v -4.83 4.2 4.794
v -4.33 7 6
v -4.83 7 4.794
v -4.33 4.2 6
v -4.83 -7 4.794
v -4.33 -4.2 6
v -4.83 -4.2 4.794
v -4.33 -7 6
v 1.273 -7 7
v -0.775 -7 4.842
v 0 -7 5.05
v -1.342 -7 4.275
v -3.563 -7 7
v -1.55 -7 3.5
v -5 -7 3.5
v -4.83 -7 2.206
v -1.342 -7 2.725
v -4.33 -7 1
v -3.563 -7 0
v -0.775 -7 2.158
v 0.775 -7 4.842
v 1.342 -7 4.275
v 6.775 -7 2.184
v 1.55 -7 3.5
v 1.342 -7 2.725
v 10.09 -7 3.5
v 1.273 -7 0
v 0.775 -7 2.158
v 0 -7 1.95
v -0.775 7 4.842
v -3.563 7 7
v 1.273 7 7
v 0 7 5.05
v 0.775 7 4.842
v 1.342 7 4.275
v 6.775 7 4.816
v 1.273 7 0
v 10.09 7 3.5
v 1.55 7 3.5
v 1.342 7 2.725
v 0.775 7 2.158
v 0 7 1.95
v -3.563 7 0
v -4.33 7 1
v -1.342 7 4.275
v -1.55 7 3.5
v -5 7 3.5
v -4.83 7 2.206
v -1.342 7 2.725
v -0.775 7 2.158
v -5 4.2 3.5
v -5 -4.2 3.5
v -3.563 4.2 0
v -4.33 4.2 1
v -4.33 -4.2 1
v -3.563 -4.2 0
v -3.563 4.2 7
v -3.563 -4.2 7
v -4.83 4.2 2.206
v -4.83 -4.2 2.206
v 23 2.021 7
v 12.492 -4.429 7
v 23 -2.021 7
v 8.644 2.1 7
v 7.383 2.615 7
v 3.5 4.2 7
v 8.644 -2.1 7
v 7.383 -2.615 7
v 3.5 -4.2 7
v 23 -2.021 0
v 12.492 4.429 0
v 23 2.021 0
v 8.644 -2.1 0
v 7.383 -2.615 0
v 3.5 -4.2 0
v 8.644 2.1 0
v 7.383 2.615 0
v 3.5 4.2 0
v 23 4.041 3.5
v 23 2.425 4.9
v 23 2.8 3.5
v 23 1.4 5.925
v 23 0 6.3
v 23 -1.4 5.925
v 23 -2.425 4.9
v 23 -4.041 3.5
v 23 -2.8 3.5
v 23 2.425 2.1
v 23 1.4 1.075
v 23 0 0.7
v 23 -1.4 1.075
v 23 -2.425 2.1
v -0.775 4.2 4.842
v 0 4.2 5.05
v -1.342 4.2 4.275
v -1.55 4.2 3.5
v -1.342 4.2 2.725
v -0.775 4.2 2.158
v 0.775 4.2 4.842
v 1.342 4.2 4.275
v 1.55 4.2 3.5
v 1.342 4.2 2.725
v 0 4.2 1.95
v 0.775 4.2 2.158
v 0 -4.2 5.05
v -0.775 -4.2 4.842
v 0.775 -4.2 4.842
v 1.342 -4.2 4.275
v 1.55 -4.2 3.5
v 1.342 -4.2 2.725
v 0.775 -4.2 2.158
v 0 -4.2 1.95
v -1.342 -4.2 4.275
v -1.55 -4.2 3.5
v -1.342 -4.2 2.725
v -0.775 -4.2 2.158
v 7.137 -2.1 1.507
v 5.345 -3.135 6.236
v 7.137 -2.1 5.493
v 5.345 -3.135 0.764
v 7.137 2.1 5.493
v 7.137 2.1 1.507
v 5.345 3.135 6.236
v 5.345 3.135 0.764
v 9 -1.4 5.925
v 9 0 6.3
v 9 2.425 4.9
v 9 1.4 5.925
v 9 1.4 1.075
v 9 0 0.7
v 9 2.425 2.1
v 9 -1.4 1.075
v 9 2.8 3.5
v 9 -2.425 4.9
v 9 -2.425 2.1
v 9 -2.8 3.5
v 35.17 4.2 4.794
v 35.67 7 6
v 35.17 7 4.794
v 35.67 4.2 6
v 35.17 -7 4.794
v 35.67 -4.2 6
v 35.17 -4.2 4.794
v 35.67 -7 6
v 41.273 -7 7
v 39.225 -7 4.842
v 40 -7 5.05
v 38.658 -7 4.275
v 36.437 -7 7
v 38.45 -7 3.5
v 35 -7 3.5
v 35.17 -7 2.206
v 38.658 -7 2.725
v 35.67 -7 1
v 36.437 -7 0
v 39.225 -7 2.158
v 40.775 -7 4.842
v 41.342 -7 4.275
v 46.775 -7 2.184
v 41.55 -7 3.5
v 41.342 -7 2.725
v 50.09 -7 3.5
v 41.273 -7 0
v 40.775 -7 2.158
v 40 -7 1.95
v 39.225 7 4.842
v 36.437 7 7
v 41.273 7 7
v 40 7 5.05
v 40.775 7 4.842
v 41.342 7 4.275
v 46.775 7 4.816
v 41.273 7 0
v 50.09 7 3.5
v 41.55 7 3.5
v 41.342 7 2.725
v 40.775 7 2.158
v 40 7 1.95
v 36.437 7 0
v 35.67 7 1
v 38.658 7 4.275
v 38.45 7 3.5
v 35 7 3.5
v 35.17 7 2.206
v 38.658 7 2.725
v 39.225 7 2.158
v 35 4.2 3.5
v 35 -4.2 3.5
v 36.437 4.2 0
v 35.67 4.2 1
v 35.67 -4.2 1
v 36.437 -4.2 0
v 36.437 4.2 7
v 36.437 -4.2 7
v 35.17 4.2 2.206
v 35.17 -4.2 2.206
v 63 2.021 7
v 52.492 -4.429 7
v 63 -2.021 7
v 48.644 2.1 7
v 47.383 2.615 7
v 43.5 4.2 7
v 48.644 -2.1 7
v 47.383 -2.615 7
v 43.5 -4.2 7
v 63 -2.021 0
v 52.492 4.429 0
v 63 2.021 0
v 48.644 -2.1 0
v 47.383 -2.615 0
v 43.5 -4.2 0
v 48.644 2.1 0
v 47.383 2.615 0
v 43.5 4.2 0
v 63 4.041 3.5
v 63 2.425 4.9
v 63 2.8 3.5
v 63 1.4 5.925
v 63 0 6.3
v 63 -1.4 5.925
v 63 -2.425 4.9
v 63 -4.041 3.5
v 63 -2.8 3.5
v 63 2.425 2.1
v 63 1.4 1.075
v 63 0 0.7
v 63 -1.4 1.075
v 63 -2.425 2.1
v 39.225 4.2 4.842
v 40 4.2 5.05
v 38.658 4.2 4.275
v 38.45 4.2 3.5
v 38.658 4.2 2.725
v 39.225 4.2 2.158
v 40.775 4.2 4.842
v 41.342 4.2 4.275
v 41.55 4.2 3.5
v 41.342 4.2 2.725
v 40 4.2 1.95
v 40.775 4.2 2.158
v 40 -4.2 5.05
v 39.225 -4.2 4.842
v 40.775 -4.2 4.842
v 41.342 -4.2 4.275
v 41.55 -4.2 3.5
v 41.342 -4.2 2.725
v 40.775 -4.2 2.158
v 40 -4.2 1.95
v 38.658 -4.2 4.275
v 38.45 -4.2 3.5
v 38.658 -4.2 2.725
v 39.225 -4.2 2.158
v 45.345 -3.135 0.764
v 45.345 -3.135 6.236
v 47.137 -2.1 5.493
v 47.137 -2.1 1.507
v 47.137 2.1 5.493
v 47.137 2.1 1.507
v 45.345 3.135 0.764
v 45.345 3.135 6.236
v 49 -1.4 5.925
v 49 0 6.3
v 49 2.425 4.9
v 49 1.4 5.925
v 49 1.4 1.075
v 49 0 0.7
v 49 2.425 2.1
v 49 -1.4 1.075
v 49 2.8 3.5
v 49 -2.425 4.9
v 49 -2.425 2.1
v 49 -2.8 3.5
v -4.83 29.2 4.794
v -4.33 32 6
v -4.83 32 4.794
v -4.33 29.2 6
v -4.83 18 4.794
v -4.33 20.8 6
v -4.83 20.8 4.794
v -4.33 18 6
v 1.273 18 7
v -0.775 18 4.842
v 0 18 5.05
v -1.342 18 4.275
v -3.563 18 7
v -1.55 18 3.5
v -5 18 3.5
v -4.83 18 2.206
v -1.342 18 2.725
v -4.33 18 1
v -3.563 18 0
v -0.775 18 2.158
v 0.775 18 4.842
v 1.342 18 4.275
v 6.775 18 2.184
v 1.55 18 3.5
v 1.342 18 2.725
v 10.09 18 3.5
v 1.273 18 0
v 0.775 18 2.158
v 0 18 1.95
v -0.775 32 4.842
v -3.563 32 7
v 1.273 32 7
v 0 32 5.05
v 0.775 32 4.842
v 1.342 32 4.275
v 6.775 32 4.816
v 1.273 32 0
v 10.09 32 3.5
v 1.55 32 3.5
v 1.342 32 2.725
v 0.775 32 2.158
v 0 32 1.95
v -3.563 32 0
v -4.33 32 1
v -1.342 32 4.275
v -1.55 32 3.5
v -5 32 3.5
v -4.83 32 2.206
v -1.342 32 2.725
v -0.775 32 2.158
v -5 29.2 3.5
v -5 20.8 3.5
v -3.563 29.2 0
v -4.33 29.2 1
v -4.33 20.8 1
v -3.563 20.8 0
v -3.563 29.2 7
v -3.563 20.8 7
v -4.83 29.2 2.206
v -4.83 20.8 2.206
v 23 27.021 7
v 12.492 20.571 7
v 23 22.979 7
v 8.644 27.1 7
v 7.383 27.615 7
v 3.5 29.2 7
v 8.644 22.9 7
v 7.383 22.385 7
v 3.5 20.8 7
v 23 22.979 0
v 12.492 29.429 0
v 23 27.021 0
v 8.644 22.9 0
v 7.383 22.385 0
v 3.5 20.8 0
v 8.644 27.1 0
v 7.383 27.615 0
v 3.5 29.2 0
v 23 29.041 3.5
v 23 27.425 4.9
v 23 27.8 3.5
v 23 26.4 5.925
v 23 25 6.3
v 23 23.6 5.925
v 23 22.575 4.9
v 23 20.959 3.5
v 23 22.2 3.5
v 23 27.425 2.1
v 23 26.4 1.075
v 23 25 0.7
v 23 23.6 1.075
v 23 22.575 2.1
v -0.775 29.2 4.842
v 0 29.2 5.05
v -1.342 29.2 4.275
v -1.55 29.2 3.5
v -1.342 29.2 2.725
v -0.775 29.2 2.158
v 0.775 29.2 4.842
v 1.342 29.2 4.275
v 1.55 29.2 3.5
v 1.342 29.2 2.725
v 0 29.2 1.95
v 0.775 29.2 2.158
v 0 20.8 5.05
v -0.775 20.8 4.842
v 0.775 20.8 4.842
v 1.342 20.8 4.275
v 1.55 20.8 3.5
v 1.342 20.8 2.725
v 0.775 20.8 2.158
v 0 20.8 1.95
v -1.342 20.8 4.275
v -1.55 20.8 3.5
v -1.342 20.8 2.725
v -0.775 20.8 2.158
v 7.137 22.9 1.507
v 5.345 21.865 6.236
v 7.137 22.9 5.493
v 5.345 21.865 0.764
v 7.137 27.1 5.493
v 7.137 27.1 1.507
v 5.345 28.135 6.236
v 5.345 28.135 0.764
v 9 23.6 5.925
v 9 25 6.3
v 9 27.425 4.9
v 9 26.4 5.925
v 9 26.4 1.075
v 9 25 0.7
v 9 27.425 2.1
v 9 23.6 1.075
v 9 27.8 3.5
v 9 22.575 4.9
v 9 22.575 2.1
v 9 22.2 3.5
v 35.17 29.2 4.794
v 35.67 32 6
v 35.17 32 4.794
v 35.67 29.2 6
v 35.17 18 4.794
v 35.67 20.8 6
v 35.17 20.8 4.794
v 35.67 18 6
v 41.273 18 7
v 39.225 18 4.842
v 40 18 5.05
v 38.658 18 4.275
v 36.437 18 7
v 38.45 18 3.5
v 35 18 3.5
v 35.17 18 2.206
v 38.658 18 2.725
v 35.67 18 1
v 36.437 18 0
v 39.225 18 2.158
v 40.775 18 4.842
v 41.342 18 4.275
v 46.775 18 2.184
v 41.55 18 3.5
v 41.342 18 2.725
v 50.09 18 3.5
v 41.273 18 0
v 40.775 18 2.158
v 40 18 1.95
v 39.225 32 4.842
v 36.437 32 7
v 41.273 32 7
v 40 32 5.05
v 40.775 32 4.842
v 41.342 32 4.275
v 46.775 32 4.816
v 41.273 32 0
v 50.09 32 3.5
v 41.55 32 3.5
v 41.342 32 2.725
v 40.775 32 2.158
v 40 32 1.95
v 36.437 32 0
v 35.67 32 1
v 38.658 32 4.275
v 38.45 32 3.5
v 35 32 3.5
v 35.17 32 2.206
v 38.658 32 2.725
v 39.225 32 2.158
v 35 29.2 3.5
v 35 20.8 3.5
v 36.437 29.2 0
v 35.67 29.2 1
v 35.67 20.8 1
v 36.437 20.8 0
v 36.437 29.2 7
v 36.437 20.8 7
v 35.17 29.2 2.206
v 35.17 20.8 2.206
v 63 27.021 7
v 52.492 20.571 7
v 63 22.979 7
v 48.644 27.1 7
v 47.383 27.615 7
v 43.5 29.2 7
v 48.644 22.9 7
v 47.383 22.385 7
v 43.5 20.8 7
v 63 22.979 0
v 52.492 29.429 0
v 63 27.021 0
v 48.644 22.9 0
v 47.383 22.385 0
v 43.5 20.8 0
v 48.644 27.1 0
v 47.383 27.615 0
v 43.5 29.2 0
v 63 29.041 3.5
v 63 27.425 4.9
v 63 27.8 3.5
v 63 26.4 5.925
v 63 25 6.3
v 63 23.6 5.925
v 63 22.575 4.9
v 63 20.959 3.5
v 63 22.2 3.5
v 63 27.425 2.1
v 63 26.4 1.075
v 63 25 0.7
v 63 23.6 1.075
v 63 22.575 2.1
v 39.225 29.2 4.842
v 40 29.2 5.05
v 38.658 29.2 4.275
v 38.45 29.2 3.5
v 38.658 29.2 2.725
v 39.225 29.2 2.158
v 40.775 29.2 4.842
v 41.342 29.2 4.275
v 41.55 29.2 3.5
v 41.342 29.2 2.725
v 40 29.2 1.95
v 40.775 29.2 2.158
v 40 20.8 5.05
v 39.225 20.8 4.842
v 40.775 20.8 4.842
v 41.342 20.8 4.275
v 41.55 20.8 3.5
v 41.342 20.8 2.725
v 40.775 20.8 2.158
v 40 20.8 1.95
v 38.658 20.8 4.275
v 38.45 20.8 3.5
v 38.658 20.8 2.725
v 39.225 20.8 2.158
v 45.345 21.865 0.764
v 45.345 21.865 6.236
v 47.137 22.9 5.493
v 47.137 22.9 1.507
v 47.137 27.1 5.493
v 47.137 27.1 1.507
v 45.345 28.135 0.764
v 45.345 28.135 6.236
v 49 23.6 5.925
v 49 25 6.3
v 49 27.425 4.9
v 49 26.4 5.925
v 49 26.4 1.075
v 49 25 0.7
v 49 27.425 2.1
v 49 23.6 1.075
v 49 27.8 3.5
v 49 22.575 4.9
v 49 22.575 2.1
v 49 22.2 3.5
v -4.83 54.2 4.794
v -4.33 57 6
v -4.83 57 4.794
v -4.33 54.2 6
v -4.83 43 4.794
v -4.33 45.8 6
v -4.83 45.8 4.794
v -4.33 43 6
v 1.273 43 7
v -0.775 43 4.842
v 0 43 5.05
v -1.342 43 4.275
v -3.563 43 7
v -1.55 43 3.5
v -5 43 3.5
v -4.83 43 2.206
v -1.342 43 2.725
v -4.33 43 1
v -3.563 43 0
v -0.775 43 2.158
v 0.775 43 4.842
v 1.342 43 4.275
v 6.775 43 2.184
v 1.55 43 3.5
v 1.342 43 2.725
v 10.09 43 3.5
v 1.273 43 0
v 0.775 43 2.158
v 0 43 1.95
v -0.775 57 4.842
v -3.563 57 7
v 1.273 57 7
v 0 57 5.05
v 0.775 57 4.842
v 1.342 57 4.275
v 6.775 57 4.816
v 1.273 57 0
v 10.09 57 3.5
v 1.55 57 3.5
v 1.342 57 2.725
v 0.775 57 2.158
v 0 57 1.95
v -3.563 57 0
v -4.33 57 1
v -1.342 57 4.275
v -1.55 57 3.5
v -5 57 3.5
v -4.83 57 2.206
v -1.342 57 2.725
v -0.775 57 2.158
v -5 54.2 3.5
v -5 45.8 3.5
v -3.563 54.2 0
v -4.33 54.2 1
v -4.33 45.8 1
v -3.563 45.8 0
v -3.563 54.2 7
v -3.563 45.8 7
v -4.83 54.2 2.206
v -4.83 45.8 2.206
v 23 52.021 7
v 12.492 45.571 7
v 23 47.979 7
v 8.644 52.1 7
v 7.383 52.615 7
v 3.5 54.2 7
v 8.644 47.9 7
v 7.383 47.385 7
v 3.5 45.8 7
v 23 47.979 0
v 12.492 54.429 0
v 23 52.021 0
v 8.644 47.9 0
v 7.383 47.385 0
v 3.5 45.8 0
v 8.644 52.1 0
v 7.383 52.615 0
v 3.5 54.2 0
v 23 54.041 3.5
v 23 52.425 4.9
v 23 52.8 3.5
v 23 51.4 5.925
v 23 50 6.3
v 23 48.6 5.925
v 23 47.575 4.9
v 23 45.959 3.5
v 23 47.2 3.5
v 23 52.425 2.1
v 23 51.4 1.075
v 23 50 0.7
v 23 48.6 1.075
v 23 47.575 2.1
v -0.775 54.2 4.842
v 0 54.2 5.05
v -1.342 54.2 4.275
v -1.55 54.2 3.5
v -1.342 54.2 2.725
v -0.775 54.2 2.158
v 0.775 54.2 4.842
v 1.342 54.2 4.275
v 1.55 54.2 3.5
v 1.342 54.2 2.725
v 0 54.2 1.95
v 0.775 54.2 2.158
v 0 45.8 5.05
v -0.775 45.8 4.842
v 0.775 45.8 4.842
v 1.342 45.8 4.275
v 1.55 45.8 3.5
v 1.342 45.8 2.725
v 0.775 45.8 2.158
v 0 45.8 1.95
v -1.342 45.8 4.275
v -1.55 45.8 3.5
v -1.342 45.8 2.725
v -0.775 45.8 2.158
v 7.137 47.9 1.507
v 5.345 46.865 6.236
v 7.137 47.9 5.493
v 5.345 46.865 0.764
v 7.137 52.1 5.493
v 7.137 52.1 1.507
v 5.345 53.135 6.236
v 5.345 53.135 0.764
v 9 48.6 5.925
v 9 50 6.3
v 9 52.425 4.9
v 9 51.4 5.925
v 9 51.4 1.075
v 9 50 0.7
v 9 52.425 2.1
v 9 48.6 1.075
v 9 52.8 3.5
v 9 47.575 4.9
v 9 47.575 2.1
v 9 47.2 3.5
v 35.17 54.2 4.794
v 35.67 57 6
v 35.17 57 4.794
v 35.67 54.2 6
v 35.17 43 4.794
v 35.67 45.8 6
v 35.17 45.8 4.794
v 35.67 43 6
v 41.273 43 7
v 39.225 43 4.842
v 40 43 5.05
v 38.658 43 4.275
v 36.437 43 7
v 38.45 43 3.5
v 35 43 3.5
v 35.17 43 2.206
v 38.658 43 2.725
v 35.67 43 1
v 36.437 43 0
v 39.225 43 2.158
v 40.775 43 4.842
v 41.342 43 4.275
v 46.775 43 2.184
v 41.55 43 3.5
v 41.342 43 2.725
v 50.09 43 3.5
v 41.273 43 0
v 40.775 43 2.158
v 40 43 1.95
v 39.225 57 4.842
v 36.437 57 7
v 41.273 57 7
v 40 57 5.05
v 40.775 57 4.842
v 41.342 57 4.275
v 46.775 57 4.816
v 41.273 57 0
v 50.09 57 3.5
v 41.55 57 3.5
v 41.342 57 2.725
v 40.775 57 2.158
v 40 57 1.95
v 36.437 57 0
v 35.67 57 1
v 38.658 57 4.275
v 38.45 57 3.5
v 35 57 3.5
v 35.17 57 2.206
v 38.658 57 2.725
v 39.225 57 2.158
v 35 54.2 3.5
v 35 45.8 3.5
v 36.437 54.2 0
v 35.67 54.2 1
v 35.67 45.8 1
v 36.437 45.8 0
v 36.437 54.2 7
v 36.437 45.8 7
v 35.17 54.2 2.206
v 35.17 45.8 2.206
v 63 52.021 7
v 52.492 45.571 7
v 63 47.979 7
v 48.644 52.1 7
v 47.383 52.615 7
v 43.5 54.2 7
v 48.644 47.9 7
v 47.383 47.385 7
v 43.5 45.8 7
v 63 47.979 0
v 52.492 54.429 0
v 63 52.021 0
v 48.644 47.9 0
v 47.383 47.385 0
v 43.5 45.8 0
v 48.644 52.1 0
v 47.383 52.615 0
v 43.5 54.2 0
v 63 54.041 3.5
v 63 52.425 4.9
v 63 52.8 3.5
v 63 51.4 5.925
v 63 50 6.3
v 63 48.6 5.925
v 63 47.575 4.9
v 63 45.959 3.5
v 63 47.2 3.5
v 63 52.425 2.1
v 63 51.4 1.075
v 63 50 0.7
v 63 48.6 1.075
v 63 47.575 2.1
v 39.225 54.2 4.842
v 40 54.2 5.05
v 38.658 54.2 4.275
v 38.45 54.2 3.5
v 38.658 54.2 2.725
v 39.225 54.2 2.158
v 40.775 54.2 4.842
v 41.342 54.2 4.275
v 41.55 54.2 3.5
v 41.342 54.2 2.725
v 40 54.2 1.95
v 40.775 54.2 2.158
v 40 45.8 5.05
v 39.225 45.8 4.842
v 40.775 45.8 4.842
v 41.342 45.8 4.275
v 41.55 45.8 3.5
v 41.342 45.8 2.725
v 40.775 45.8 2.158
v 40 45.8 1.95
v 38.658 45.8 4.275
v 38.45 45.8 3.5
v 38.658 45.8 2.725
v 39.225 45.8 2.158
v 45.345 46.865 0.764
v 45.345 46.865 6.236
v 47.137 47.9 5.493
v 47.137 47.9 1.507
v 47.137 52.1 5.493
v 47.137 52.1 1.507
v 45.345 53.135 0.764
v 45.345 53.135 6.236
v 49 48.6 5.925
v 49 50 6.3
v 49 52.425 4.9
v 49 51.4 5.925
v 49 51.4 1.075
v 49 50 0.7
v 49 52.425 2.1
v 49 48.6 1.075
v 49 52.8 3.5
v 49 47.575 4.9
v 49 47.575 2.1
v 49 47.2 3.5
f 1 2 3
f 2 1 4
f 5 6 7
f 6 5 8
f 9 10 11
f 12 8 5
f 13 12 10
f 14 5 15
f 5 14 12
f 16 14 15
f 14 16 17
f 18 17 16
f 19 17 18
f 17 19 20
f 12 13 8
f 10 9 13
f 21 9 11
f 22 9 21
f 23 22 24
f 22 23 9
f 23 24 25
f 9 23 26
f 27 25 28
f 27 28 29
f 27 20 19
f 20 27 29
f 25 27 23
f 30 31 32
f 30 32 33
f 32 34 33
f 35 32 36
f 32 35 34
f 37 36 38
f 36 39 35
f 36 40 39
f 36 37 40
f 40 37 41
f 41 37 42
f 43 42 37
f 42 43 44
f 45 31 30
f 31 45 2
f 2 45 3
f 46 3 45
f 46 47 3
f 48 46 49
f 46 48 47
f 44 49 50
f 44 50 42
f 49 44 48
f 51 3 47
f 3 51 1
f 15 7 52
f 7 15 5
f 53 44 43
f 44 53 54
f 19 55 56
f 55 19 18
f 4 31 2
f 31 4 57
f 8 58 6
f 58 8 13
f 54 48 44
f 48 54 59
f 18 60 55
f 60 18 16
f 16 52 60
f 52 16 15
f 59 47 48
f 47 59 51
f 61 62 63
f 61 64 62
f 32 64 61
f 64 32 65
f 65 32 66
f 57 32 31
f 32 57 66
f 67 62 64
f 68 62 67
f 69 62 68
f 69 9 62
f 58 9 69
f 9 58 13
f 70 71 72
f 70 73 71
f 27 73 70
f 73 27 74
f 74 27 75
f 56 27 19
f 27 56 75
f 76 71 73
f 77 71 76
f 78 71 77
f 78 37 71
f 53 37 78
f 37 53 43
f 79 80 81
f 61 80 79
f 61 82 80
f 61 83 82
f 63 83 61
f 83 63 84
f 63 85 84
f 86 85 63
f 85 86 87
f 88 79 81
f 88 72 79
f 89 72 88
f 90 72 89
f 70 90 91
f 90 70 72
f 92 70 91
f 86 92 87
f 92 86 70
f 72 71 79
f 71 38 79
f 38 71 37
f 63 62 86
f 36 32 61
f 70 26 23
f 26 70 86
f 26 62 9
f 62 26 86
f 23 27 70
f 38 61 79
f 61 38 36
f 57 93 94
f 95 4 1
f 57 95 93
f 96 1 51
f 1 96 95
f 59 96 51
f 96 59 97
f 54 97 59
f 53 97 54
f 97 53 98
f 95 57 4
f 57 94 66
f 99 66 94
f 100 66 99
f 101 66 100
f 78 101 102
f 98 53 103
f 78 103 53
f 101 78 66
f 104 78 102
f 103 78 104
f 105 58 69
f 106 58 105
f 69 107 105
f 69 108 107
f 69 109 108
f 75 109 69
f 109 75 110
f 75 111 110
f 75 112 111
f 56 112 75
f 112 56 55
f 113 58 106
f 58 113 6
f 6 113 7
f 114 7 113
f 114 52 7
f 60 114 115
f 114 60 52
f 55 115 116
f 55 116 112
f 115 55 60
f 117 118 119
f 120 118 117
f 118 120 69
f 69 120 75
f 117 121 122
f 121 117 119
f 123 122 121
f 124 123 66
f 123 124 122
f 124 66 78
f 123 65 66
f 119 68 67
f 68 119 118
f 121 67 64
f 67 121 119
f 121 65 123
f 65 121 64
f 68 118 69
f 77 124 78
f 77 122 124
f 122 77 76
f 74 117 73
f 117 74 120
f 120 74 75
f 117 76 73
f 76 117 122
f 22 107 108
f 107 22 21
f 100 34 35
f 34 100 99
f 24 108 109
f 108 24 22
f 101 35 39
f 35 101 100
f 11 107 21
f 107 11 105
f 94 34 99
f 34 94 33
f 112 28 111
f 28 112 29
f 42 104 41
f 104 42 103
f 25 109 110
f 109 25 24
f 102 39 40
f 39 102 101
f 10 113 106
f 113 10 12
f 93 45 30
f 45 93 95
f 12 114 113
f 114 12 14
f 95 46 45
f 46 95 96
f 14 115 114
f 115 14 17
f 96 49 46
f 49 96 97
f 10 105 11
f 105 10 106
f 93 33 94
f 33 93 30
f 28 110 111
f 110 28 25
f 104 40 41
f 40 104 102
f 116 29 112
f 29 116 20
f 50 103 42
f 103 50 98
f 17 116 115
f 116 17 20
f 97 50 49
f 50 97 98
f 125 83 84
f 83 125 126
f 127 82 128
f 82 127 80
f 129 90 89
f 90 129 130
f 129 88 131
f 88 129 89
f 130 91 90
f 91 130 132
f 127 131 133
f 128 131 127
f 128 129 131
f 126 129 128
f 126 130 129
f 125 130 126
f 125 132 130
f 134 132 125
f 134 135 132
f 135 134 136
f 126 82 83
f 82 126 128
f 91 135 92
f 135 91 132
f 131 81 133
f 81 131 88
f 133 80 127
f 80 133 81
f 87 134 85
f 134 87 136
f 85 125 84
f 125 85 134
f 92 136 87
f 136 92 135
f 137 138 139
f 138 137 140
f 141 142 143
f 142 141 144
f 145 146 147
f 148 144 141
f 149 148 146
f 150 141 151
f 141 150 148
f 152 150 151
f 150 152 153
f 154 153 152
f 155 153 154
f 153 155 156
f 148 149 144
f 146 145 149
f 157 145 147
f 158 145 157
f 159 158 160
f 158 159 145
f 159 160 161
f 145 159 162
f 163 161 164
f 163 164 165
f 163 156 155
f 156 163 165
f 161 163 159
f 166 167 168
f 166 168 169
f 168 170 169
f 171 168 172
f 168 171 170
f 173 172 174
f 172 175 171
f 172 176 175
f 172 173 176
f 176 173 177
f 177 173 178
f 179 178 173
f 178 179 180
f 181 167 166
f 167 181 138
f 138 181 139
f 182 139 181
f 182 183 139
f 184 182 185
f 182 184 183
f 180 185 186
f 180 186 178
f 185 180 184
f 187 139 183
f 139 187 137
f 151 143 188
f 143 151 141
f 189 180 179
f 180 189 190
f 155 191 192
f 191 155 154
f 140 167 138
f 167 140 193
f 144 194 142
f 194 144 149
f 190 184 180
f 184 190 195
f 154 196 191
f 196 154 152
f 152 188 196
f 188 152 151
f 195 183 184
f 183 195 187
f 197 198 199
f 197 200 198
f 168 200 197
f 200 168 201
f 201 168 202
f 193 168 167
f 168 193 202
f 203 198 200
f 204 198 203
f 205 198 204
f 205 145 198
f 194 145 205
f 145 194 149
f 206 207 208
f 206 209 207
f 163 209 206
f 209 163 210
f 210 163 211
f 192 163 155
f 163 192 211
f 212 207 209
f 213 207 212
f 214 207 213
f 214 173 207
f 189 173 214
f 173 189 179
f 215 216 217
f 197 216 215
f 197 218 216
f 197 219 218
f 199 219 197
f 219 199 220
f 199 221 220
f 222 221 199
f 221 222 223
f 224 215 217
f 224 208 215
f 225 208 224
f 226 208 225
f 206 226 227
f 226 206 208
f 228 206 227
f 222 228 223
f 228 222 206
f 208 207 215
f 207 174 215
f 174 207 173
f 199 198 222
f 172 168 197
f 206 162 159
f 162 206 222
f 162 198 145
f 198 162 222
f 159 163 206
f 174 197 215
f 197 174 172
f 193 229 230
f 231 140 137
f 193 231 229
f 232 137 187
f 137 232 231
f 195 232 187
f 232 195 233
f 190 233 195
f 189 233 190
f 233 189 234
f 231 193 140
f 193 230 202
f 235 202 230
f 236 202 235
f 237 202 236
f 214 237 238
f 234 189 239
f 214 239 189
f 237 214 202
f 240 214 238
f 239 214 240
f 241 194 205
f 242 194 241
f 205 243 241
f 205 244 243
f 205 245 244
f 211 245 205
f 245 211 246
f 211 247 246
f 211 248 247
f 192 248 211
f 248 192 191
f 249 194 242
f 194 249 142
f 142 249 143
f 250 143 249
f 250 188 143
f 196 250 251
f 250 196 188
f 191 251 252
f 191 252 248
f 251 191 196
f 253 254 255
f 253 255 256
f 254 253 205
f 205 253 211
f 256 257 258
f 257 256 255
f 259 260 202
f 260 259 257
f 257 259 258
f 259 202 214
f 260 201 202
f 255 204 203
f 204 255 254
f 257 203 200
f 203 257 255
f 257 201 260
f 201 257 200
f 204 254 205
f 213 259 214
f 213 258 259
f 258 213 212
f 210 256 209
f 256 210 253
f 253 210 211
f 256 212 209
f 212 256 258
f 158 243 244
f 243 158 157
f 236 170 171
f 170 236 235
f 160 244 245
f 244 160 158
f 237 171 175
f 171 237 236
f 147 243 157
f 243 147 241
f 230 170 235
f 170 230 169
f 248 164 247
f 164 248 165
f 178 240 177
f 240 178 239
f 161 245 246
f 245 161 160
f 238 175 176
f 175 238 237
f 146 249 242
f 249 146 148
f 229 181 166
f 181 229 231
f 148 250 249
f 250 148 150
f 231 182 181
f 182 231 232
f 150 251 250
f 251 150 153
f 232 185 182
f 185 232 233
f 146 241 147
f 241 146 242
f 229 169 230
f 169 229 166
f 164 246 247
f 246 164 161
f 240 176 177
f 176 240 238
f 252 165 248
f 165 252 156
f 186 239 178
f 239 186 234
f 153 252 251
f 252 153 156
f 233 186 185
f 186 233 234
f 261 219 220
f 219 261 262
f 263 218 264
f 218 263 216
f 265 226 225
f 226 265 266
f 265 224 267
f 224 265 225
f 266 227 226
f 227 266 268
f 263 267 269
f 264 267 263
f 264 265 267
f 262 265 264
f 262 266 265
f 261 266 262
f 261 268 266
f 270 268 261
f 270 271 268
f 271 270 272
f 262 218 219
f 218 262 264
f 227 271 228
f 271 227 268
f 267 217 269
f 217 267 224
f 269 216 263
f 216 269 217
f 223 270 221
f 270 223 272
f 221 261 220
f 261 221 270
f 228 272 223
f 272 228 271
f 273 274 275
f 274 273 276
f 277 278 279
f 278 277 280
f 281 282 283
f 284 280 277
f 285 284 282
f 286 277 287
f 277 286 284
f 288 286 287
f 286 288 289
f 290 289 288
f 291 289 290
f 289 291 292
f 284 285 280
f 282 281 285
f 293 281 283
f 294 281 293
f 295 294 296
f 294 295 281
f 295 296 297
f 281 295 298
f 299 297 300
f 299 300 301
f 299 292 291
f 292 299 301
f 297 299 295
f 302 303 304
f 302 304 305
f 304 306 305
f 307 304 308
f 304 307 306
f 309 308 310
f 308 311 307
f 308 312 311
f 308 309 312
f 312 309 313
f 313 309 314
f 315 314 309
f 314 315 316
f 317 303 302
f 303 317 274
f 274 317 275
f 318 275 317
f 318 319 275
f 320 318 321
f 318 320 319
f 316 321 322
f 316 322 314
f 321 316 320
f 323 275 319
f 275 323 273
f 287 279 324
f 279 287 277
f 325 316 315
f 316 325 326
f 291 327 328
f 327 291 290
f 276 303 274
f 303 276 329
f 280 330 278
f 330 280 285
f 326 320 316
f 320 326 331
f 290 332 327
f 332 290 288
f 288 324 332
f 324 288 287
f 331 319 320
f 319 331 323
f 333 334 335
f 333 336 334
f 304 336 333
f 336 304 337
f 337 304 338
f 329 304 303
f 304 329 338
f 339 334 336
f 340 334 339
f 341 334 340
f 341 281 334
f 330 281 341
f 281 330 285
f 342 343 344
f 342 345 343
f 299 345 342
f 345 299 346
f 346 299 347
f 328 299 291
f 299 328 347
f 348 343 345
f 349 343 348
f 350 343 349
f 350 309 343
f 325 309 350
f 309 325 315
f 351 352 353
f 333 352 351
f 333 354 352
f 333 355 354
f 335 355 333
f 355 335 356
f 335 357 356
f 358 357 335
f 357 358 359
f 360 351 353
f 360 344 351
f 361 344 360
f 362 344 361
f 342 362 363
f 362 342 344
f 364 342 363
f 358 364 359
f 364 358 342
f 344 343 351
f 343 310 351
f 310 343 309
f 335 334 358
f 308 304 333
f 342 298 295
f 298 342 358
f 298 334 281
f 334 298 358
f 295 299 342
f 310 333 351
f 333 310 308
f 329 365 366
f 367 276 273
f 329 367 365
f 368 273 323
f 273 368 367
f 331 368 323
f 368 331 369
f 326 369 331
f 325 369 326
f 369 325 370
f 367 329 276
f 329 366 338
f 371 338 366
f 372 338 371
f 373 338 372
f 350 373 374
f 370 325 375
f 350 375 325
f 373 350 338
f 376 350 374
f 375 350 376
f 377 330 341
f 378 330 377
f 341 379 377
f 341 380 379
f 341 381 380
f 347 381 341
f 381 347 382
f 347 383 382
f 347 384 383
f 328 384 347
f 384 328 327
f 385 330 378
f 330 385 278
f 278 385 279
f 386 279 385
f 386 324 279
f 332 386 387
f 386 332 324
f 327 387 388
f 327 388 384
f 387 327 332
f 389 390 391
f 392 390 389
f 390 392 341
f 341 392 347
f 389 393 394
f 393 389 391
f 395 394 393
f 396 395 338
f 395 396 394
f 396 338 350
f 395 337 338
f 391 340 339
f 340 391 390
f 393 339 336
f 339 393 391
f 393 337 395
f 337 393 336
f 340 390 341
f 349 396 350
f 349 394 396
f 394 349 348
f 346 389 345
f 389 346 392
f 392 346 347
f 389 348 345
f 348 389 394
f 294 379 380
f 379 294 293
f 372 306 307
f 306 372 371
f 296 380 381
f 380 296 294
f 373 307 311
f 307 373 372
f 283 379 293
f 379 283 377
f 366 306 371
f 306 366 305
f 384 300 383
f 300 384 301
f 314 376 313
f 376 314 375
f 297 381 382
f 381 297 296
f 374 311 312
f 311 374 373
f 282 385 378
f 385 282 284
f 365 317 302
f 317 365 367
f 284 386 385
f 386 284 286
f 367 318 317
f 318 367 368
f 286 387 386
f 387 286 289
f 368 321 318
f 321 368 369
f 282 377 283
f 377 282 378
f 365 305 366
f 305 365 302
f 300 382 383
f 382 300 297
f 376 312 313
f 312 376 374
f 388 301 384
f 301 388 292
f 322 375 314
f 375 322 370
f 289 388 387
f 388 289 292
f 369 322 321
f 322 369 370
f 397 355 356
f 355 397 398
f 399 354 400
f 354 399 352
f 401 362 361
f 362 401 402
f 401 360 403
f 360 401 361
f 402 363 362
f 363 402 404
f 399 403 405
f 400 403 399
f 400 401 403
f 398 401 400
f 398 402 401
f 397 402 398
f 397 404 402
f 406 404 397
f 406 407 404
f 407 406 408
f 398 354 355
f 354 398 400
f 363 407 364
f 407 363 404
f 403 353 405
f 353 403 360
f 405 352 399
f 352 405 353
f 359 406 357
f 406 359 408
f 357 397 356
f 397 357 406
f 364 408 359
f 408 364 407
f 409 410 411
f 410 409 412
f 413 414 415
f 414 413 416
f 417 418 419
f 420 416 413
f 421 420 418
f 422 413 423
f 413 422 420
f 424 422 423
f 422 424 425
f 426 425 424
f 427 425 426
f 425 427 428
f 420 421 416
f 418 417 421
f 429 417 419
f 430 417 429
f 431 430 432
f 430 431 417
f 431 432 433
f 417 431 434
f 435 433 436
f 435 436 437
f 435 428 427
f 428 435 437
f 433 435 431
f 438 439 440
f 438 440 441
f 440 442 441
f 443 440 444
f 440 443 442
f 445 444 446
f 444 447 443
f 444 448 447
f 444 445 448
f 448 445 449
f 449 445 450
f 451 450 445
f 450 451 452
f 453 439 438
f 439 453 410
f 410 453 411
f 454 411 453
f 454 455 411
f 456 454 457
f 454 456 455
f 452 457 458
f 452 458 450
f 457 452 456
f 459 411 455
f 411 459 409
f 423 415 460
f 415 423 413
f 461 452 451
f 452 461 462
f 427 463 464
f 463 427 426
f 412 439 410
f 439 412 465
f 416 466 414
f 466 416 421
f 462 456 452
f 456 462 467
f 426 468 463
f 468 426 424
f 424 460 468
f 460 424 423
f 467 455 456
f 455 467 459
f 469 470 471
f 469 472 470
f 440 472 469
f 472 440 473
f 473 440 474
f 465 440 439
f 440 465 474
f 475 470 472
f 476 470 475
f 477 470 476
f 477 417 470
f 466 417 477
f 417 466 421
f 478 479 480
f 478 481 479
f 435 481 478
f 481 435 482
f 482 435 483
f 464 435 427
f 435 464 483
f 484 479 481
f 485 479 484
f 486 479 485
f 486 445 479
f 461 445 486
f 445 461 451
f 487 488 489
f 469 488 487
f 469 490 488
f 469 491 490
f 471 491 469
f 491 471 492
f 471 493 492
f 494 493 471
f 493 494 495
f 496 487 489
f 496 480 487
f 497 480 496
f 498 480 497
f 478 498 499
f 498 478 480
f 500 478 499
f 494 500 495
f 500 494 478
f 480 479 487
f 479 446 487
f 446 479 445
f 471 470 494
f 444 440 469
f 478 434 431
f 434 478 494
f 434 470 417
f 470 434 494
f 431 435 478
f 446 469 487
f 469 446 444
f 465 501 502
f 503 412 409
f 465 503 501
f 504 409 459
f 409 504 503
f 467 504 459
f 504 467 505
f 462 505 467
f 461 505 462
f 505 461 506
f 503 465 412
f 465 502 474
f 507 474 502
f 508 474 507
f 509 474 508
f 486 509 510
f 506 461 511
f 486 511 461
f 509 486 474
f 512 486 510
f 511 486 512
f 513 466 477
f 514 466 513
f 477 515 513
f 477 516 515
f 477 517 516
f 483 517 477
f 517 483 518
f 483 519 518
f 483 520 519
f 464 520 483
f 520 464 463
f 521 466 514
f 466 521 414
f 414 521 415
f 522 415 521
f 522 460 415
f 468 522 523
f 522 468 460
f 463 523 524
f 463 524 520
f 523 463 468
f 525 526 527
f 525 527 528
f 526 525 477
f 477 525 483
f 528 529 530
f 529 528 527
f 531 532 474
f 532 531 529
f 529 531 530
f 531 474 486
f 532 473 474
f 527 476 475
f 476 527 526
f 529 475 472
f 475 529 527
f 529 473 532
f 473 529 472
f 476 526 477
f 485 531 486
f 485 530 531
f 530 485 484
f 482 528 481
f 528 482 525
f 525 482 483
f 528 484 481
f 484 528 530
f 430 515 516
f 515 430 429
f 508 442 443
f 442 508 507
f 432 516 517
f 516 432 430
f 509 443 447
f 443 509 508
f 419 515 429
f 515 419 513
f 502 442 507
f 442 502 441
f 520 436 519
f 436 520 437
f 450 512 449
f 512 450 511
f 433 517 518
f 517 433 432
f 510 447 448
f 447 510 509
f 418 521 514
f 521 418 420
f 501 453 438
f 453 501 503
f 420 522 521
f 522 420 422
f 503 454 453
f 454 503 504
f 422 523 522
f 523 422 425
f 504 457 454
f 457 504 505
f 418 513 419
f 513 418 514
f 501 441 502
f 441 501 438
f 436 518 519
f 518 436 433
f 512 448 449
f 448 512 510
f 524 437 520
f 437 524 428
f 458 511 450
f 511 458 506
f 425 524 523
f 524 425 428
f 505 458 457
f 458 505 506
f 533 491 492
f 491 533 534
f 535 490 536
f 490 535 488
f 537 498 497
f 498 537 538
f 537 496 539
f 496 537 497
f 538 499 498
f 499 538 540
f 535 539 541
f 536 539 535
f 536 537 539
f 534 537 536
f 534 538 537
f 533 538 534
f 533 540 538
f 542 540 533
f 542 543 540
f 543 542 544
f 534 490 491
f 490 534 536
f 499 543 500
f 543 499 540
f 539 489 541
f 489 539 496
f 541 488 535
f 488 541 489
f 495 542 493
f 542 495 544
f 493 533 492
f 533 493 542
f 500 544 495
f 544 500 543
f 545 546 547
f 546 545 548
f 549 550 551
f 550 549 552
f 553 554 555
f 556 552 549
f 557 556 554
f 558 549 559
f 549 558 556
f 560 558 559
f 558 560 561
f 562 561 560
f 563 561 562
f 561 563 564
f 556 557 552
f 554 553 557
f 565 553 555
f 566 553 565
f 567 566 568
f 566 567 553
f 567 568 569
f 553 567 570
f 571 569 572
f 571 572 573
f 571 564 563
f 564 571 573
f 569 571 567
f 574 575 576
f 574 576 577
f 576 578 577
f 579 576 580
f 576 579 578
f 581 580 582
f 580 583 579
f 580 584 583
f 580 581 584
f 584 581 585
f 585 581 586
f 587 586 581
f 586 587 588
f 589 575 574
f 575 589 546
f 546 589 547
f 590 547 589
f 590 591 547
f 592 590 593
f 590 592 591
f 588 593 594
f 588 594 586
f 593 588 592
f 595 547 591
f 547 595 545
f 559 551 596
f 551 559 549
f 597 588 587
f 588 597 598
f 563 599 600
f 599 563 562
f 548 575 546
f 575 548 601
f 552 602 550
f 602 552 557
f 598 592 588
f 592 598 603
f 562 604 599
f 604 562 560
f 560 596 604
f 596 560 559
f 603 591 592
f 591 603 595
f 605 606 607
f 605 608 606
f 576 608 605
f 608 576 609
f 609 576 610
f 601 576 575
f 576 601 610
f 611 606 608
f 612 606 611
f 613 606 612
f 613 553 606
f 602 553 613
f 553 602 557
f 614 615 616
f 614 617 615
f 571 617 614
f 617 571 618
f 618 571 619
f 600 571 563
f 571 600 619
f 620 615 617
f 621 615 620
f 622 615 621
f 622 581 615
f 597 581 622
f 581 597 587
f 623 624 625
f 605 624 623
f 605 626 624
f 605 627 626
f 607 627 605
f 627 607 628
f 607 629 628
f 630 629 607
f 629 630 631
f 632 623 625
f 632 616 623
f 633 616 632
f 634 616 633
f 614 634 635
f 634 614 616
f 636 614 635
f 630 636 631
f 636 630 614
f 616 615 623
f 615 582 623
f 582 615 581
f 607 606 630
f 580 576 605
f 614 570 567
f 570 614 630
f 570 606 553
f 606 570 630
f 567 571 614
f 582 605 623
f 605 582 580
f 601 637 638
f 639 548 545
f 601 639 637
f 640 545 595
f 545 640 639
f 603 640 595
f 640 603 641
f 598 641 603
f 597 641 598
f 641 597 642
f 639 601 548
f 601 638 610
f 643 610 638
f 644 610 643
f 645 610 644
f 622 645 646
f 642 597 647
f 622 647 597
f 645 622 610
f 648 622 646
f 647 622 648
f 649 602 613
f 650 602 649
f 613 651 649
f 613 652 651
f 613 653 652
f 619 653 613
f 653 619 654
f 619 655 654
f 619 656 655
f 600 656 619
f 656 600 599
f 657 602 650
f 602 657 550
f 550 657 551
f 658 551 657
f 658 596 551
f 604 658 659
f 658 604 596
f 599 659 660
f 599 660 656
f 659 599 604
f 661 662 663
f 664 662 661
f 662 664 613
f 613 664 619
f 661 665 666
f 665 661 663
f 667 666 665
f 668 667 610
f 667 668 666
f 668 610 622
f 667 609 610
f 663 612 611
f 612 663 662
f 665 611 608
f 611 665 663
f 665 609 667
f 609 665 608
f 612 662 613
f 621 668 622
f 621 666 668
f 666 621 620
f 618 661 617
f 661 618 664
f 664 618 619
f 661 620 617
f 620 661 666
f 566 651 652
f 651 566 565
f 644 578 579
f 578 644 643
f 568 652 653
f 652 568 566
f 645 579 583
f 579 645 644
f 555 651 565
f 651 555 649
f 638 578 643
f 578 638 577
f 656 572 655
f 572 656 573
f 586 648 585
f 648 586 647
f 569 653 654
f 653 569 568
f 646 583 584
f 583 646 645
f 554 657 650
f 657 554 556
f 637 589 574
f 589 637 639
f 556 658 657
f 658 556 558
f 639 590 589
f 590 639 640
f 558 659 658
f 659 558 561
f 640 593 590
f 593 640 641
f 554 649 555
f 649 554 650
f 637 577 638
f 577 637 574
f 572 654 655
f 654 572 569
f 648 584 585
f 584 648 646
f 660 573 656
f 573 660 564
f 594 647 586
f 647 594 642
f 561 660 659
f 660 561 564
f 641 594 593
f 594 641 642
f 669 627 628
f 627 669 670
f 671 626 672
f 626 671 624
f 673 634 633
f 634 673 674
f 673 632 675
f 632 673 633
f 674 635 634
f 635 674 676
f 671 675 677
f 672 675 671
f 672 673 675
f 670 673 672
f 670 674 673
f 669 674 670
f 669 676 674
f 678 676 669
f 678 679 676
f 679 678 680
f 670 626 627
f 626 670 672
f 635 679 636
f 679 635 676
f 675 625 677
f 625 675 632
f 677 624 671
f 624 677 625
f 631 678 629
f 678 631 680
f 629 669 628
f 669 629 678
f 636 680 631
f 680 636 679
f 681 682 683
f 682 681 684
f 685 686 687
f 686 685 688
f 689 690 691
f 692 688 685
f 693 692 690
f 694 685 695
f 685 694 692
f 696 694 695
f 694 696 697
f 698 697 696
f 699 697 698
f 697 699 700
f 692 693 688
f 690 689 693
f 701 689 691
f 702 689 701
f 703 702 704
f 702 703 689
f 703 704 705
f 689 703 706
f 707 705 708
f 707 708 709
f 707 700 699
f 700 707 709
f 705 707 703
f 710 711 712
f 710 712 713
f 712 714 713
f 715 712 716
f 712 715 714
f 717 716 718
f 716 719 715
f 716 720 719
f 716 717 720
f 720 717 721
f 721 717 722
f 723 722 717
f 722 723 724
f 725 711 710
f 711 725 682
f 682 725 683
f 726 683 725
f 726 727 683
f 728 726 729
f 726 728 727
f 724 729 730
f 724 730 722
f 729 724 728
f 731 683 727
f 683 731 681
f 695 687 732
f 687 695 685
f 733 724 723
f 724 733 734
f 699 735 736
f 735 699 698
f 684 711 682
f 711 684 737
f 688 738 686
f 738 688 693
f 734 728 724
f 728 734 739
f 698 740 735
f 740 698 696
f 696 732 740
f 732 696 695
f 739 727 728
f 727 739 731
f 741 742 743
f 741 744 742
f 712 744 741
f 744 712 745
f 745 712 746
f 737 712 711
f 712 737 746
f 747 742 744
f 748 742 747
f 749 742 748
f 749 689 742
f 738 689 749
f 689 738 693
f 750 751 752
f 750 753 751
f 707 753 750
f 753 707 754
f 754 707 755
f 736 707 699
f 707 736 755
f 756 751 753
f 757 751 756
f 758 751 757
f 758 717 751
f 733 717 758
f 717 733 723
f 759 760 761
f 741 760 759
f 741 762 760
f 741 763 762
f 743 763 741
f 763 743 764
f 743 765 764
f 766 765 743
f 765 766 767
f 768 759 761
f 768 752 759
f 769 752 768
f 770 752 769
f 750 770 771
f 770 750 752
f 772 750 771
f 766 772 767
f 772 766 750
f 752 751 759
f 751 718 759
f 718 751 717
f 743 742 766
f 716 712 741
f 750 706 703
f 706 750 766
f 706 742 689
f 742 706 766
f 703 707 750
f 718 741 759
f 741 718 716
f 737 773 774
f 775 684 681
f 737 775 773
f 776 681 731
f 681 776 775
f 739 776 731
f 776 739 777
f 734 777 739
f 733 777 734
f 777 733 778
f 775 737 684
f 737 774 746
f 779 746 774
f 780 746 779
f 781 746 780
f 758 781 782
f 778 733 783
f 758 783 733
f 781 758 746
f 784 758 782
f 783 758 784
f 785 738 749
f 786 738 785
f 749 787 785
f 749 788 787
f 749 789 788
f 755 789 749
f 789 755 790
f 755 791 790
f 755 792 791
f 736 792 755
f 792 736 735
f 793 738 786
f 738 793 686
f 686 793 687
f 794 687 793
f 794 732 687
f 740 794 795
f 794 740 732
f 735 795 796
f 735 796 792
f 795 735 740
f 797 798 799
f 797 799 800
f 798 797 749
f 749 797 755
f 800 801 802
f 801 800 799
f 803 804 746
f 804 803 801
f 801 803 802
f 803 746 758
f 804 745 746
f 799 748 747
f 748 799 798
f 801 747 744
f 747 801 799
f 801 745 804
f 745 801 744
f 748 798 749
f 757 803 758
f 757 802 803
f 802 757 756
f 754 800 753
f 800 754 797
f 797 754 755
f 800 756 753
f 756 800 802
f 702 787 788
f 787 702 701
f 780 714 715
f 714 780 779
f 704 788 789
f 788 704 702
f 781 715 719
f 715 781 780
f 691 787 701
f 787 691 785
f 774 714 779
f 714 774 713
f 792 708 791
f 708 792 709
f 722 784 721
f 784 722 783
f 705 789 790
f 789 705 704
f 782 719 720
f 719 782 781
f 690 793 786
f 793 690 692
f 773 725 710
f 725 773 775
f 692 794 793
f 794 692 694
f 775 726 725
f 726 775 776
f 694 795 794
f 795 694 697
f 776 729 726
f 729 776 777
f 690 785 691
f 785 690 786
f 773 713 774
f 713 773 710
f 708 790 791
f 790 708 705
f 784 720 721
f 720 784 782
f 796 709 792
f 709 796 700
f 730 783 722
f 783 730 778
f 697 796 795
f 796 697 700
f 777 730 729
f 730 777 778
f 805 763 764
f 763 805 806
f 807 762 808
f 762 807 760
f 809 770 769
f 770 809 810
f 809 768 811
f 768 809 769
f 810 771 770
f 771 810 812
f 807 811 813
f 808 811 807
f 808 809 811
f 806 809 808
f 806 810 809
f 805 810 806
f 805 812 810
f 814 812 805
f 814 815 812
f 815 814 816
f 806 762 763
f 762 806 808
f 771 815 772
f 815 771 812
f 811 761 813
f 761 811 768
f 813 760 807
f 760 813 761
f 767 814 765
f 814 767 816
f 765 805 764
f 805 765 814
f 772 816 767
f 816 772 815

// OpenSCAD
h = 7;
r = h/2 / cos(30);

module jaws() {
  difference() {
    union() {
      intersection () {
        rotate([90, 0, 0]) cylinder(r=5, h=14, center=true, $fn=24);
        translate([-4, 0, 0]) cube([10, 14, h], center=true);
      }
      intersection() {
        translate([10, 0, 0]) cube([26, 14, h], center=true);
        translate([10, 0, 0]) rotate([0, 90, 0]) rotate([0, 0, 30])
          cylinder(r1=10, r2=r, h=26, center=true, $fn=6);
      }
    }
    translate([-1.5, 0, 0]) cube([10, 8.4, 10], center=true);
    translate([3.5, 0, 0]) rotate([0, 0, 30])
      cylinder(r=4.2, h=10, center=true, $fn=6);
    translate([4, 0, 4]) rotate([0, 45, 0])
      rotate([0, 0, 30]) cylinder(r=4.2, h=8, center=true, $fn=6);
    translate([4, 0, -4]) rotate([0, -45, 0])
      rotate([0, 0, 30]) cylinder(r=4.2, h=8, center=true, $fn=6);
    rotate([90, 0, 0]) cylinder(r=1.55, h=40, center=true, $fn=12);
    translate([19, 0, 0]) rotate([0, 90, 0])
      cylinder(r=2.8, h=20, center=true, $fn=12);
  }
}


for(x=[0:2]) for (y=[0:1])
translate([y*40, x*25, h/2]) jaws();
